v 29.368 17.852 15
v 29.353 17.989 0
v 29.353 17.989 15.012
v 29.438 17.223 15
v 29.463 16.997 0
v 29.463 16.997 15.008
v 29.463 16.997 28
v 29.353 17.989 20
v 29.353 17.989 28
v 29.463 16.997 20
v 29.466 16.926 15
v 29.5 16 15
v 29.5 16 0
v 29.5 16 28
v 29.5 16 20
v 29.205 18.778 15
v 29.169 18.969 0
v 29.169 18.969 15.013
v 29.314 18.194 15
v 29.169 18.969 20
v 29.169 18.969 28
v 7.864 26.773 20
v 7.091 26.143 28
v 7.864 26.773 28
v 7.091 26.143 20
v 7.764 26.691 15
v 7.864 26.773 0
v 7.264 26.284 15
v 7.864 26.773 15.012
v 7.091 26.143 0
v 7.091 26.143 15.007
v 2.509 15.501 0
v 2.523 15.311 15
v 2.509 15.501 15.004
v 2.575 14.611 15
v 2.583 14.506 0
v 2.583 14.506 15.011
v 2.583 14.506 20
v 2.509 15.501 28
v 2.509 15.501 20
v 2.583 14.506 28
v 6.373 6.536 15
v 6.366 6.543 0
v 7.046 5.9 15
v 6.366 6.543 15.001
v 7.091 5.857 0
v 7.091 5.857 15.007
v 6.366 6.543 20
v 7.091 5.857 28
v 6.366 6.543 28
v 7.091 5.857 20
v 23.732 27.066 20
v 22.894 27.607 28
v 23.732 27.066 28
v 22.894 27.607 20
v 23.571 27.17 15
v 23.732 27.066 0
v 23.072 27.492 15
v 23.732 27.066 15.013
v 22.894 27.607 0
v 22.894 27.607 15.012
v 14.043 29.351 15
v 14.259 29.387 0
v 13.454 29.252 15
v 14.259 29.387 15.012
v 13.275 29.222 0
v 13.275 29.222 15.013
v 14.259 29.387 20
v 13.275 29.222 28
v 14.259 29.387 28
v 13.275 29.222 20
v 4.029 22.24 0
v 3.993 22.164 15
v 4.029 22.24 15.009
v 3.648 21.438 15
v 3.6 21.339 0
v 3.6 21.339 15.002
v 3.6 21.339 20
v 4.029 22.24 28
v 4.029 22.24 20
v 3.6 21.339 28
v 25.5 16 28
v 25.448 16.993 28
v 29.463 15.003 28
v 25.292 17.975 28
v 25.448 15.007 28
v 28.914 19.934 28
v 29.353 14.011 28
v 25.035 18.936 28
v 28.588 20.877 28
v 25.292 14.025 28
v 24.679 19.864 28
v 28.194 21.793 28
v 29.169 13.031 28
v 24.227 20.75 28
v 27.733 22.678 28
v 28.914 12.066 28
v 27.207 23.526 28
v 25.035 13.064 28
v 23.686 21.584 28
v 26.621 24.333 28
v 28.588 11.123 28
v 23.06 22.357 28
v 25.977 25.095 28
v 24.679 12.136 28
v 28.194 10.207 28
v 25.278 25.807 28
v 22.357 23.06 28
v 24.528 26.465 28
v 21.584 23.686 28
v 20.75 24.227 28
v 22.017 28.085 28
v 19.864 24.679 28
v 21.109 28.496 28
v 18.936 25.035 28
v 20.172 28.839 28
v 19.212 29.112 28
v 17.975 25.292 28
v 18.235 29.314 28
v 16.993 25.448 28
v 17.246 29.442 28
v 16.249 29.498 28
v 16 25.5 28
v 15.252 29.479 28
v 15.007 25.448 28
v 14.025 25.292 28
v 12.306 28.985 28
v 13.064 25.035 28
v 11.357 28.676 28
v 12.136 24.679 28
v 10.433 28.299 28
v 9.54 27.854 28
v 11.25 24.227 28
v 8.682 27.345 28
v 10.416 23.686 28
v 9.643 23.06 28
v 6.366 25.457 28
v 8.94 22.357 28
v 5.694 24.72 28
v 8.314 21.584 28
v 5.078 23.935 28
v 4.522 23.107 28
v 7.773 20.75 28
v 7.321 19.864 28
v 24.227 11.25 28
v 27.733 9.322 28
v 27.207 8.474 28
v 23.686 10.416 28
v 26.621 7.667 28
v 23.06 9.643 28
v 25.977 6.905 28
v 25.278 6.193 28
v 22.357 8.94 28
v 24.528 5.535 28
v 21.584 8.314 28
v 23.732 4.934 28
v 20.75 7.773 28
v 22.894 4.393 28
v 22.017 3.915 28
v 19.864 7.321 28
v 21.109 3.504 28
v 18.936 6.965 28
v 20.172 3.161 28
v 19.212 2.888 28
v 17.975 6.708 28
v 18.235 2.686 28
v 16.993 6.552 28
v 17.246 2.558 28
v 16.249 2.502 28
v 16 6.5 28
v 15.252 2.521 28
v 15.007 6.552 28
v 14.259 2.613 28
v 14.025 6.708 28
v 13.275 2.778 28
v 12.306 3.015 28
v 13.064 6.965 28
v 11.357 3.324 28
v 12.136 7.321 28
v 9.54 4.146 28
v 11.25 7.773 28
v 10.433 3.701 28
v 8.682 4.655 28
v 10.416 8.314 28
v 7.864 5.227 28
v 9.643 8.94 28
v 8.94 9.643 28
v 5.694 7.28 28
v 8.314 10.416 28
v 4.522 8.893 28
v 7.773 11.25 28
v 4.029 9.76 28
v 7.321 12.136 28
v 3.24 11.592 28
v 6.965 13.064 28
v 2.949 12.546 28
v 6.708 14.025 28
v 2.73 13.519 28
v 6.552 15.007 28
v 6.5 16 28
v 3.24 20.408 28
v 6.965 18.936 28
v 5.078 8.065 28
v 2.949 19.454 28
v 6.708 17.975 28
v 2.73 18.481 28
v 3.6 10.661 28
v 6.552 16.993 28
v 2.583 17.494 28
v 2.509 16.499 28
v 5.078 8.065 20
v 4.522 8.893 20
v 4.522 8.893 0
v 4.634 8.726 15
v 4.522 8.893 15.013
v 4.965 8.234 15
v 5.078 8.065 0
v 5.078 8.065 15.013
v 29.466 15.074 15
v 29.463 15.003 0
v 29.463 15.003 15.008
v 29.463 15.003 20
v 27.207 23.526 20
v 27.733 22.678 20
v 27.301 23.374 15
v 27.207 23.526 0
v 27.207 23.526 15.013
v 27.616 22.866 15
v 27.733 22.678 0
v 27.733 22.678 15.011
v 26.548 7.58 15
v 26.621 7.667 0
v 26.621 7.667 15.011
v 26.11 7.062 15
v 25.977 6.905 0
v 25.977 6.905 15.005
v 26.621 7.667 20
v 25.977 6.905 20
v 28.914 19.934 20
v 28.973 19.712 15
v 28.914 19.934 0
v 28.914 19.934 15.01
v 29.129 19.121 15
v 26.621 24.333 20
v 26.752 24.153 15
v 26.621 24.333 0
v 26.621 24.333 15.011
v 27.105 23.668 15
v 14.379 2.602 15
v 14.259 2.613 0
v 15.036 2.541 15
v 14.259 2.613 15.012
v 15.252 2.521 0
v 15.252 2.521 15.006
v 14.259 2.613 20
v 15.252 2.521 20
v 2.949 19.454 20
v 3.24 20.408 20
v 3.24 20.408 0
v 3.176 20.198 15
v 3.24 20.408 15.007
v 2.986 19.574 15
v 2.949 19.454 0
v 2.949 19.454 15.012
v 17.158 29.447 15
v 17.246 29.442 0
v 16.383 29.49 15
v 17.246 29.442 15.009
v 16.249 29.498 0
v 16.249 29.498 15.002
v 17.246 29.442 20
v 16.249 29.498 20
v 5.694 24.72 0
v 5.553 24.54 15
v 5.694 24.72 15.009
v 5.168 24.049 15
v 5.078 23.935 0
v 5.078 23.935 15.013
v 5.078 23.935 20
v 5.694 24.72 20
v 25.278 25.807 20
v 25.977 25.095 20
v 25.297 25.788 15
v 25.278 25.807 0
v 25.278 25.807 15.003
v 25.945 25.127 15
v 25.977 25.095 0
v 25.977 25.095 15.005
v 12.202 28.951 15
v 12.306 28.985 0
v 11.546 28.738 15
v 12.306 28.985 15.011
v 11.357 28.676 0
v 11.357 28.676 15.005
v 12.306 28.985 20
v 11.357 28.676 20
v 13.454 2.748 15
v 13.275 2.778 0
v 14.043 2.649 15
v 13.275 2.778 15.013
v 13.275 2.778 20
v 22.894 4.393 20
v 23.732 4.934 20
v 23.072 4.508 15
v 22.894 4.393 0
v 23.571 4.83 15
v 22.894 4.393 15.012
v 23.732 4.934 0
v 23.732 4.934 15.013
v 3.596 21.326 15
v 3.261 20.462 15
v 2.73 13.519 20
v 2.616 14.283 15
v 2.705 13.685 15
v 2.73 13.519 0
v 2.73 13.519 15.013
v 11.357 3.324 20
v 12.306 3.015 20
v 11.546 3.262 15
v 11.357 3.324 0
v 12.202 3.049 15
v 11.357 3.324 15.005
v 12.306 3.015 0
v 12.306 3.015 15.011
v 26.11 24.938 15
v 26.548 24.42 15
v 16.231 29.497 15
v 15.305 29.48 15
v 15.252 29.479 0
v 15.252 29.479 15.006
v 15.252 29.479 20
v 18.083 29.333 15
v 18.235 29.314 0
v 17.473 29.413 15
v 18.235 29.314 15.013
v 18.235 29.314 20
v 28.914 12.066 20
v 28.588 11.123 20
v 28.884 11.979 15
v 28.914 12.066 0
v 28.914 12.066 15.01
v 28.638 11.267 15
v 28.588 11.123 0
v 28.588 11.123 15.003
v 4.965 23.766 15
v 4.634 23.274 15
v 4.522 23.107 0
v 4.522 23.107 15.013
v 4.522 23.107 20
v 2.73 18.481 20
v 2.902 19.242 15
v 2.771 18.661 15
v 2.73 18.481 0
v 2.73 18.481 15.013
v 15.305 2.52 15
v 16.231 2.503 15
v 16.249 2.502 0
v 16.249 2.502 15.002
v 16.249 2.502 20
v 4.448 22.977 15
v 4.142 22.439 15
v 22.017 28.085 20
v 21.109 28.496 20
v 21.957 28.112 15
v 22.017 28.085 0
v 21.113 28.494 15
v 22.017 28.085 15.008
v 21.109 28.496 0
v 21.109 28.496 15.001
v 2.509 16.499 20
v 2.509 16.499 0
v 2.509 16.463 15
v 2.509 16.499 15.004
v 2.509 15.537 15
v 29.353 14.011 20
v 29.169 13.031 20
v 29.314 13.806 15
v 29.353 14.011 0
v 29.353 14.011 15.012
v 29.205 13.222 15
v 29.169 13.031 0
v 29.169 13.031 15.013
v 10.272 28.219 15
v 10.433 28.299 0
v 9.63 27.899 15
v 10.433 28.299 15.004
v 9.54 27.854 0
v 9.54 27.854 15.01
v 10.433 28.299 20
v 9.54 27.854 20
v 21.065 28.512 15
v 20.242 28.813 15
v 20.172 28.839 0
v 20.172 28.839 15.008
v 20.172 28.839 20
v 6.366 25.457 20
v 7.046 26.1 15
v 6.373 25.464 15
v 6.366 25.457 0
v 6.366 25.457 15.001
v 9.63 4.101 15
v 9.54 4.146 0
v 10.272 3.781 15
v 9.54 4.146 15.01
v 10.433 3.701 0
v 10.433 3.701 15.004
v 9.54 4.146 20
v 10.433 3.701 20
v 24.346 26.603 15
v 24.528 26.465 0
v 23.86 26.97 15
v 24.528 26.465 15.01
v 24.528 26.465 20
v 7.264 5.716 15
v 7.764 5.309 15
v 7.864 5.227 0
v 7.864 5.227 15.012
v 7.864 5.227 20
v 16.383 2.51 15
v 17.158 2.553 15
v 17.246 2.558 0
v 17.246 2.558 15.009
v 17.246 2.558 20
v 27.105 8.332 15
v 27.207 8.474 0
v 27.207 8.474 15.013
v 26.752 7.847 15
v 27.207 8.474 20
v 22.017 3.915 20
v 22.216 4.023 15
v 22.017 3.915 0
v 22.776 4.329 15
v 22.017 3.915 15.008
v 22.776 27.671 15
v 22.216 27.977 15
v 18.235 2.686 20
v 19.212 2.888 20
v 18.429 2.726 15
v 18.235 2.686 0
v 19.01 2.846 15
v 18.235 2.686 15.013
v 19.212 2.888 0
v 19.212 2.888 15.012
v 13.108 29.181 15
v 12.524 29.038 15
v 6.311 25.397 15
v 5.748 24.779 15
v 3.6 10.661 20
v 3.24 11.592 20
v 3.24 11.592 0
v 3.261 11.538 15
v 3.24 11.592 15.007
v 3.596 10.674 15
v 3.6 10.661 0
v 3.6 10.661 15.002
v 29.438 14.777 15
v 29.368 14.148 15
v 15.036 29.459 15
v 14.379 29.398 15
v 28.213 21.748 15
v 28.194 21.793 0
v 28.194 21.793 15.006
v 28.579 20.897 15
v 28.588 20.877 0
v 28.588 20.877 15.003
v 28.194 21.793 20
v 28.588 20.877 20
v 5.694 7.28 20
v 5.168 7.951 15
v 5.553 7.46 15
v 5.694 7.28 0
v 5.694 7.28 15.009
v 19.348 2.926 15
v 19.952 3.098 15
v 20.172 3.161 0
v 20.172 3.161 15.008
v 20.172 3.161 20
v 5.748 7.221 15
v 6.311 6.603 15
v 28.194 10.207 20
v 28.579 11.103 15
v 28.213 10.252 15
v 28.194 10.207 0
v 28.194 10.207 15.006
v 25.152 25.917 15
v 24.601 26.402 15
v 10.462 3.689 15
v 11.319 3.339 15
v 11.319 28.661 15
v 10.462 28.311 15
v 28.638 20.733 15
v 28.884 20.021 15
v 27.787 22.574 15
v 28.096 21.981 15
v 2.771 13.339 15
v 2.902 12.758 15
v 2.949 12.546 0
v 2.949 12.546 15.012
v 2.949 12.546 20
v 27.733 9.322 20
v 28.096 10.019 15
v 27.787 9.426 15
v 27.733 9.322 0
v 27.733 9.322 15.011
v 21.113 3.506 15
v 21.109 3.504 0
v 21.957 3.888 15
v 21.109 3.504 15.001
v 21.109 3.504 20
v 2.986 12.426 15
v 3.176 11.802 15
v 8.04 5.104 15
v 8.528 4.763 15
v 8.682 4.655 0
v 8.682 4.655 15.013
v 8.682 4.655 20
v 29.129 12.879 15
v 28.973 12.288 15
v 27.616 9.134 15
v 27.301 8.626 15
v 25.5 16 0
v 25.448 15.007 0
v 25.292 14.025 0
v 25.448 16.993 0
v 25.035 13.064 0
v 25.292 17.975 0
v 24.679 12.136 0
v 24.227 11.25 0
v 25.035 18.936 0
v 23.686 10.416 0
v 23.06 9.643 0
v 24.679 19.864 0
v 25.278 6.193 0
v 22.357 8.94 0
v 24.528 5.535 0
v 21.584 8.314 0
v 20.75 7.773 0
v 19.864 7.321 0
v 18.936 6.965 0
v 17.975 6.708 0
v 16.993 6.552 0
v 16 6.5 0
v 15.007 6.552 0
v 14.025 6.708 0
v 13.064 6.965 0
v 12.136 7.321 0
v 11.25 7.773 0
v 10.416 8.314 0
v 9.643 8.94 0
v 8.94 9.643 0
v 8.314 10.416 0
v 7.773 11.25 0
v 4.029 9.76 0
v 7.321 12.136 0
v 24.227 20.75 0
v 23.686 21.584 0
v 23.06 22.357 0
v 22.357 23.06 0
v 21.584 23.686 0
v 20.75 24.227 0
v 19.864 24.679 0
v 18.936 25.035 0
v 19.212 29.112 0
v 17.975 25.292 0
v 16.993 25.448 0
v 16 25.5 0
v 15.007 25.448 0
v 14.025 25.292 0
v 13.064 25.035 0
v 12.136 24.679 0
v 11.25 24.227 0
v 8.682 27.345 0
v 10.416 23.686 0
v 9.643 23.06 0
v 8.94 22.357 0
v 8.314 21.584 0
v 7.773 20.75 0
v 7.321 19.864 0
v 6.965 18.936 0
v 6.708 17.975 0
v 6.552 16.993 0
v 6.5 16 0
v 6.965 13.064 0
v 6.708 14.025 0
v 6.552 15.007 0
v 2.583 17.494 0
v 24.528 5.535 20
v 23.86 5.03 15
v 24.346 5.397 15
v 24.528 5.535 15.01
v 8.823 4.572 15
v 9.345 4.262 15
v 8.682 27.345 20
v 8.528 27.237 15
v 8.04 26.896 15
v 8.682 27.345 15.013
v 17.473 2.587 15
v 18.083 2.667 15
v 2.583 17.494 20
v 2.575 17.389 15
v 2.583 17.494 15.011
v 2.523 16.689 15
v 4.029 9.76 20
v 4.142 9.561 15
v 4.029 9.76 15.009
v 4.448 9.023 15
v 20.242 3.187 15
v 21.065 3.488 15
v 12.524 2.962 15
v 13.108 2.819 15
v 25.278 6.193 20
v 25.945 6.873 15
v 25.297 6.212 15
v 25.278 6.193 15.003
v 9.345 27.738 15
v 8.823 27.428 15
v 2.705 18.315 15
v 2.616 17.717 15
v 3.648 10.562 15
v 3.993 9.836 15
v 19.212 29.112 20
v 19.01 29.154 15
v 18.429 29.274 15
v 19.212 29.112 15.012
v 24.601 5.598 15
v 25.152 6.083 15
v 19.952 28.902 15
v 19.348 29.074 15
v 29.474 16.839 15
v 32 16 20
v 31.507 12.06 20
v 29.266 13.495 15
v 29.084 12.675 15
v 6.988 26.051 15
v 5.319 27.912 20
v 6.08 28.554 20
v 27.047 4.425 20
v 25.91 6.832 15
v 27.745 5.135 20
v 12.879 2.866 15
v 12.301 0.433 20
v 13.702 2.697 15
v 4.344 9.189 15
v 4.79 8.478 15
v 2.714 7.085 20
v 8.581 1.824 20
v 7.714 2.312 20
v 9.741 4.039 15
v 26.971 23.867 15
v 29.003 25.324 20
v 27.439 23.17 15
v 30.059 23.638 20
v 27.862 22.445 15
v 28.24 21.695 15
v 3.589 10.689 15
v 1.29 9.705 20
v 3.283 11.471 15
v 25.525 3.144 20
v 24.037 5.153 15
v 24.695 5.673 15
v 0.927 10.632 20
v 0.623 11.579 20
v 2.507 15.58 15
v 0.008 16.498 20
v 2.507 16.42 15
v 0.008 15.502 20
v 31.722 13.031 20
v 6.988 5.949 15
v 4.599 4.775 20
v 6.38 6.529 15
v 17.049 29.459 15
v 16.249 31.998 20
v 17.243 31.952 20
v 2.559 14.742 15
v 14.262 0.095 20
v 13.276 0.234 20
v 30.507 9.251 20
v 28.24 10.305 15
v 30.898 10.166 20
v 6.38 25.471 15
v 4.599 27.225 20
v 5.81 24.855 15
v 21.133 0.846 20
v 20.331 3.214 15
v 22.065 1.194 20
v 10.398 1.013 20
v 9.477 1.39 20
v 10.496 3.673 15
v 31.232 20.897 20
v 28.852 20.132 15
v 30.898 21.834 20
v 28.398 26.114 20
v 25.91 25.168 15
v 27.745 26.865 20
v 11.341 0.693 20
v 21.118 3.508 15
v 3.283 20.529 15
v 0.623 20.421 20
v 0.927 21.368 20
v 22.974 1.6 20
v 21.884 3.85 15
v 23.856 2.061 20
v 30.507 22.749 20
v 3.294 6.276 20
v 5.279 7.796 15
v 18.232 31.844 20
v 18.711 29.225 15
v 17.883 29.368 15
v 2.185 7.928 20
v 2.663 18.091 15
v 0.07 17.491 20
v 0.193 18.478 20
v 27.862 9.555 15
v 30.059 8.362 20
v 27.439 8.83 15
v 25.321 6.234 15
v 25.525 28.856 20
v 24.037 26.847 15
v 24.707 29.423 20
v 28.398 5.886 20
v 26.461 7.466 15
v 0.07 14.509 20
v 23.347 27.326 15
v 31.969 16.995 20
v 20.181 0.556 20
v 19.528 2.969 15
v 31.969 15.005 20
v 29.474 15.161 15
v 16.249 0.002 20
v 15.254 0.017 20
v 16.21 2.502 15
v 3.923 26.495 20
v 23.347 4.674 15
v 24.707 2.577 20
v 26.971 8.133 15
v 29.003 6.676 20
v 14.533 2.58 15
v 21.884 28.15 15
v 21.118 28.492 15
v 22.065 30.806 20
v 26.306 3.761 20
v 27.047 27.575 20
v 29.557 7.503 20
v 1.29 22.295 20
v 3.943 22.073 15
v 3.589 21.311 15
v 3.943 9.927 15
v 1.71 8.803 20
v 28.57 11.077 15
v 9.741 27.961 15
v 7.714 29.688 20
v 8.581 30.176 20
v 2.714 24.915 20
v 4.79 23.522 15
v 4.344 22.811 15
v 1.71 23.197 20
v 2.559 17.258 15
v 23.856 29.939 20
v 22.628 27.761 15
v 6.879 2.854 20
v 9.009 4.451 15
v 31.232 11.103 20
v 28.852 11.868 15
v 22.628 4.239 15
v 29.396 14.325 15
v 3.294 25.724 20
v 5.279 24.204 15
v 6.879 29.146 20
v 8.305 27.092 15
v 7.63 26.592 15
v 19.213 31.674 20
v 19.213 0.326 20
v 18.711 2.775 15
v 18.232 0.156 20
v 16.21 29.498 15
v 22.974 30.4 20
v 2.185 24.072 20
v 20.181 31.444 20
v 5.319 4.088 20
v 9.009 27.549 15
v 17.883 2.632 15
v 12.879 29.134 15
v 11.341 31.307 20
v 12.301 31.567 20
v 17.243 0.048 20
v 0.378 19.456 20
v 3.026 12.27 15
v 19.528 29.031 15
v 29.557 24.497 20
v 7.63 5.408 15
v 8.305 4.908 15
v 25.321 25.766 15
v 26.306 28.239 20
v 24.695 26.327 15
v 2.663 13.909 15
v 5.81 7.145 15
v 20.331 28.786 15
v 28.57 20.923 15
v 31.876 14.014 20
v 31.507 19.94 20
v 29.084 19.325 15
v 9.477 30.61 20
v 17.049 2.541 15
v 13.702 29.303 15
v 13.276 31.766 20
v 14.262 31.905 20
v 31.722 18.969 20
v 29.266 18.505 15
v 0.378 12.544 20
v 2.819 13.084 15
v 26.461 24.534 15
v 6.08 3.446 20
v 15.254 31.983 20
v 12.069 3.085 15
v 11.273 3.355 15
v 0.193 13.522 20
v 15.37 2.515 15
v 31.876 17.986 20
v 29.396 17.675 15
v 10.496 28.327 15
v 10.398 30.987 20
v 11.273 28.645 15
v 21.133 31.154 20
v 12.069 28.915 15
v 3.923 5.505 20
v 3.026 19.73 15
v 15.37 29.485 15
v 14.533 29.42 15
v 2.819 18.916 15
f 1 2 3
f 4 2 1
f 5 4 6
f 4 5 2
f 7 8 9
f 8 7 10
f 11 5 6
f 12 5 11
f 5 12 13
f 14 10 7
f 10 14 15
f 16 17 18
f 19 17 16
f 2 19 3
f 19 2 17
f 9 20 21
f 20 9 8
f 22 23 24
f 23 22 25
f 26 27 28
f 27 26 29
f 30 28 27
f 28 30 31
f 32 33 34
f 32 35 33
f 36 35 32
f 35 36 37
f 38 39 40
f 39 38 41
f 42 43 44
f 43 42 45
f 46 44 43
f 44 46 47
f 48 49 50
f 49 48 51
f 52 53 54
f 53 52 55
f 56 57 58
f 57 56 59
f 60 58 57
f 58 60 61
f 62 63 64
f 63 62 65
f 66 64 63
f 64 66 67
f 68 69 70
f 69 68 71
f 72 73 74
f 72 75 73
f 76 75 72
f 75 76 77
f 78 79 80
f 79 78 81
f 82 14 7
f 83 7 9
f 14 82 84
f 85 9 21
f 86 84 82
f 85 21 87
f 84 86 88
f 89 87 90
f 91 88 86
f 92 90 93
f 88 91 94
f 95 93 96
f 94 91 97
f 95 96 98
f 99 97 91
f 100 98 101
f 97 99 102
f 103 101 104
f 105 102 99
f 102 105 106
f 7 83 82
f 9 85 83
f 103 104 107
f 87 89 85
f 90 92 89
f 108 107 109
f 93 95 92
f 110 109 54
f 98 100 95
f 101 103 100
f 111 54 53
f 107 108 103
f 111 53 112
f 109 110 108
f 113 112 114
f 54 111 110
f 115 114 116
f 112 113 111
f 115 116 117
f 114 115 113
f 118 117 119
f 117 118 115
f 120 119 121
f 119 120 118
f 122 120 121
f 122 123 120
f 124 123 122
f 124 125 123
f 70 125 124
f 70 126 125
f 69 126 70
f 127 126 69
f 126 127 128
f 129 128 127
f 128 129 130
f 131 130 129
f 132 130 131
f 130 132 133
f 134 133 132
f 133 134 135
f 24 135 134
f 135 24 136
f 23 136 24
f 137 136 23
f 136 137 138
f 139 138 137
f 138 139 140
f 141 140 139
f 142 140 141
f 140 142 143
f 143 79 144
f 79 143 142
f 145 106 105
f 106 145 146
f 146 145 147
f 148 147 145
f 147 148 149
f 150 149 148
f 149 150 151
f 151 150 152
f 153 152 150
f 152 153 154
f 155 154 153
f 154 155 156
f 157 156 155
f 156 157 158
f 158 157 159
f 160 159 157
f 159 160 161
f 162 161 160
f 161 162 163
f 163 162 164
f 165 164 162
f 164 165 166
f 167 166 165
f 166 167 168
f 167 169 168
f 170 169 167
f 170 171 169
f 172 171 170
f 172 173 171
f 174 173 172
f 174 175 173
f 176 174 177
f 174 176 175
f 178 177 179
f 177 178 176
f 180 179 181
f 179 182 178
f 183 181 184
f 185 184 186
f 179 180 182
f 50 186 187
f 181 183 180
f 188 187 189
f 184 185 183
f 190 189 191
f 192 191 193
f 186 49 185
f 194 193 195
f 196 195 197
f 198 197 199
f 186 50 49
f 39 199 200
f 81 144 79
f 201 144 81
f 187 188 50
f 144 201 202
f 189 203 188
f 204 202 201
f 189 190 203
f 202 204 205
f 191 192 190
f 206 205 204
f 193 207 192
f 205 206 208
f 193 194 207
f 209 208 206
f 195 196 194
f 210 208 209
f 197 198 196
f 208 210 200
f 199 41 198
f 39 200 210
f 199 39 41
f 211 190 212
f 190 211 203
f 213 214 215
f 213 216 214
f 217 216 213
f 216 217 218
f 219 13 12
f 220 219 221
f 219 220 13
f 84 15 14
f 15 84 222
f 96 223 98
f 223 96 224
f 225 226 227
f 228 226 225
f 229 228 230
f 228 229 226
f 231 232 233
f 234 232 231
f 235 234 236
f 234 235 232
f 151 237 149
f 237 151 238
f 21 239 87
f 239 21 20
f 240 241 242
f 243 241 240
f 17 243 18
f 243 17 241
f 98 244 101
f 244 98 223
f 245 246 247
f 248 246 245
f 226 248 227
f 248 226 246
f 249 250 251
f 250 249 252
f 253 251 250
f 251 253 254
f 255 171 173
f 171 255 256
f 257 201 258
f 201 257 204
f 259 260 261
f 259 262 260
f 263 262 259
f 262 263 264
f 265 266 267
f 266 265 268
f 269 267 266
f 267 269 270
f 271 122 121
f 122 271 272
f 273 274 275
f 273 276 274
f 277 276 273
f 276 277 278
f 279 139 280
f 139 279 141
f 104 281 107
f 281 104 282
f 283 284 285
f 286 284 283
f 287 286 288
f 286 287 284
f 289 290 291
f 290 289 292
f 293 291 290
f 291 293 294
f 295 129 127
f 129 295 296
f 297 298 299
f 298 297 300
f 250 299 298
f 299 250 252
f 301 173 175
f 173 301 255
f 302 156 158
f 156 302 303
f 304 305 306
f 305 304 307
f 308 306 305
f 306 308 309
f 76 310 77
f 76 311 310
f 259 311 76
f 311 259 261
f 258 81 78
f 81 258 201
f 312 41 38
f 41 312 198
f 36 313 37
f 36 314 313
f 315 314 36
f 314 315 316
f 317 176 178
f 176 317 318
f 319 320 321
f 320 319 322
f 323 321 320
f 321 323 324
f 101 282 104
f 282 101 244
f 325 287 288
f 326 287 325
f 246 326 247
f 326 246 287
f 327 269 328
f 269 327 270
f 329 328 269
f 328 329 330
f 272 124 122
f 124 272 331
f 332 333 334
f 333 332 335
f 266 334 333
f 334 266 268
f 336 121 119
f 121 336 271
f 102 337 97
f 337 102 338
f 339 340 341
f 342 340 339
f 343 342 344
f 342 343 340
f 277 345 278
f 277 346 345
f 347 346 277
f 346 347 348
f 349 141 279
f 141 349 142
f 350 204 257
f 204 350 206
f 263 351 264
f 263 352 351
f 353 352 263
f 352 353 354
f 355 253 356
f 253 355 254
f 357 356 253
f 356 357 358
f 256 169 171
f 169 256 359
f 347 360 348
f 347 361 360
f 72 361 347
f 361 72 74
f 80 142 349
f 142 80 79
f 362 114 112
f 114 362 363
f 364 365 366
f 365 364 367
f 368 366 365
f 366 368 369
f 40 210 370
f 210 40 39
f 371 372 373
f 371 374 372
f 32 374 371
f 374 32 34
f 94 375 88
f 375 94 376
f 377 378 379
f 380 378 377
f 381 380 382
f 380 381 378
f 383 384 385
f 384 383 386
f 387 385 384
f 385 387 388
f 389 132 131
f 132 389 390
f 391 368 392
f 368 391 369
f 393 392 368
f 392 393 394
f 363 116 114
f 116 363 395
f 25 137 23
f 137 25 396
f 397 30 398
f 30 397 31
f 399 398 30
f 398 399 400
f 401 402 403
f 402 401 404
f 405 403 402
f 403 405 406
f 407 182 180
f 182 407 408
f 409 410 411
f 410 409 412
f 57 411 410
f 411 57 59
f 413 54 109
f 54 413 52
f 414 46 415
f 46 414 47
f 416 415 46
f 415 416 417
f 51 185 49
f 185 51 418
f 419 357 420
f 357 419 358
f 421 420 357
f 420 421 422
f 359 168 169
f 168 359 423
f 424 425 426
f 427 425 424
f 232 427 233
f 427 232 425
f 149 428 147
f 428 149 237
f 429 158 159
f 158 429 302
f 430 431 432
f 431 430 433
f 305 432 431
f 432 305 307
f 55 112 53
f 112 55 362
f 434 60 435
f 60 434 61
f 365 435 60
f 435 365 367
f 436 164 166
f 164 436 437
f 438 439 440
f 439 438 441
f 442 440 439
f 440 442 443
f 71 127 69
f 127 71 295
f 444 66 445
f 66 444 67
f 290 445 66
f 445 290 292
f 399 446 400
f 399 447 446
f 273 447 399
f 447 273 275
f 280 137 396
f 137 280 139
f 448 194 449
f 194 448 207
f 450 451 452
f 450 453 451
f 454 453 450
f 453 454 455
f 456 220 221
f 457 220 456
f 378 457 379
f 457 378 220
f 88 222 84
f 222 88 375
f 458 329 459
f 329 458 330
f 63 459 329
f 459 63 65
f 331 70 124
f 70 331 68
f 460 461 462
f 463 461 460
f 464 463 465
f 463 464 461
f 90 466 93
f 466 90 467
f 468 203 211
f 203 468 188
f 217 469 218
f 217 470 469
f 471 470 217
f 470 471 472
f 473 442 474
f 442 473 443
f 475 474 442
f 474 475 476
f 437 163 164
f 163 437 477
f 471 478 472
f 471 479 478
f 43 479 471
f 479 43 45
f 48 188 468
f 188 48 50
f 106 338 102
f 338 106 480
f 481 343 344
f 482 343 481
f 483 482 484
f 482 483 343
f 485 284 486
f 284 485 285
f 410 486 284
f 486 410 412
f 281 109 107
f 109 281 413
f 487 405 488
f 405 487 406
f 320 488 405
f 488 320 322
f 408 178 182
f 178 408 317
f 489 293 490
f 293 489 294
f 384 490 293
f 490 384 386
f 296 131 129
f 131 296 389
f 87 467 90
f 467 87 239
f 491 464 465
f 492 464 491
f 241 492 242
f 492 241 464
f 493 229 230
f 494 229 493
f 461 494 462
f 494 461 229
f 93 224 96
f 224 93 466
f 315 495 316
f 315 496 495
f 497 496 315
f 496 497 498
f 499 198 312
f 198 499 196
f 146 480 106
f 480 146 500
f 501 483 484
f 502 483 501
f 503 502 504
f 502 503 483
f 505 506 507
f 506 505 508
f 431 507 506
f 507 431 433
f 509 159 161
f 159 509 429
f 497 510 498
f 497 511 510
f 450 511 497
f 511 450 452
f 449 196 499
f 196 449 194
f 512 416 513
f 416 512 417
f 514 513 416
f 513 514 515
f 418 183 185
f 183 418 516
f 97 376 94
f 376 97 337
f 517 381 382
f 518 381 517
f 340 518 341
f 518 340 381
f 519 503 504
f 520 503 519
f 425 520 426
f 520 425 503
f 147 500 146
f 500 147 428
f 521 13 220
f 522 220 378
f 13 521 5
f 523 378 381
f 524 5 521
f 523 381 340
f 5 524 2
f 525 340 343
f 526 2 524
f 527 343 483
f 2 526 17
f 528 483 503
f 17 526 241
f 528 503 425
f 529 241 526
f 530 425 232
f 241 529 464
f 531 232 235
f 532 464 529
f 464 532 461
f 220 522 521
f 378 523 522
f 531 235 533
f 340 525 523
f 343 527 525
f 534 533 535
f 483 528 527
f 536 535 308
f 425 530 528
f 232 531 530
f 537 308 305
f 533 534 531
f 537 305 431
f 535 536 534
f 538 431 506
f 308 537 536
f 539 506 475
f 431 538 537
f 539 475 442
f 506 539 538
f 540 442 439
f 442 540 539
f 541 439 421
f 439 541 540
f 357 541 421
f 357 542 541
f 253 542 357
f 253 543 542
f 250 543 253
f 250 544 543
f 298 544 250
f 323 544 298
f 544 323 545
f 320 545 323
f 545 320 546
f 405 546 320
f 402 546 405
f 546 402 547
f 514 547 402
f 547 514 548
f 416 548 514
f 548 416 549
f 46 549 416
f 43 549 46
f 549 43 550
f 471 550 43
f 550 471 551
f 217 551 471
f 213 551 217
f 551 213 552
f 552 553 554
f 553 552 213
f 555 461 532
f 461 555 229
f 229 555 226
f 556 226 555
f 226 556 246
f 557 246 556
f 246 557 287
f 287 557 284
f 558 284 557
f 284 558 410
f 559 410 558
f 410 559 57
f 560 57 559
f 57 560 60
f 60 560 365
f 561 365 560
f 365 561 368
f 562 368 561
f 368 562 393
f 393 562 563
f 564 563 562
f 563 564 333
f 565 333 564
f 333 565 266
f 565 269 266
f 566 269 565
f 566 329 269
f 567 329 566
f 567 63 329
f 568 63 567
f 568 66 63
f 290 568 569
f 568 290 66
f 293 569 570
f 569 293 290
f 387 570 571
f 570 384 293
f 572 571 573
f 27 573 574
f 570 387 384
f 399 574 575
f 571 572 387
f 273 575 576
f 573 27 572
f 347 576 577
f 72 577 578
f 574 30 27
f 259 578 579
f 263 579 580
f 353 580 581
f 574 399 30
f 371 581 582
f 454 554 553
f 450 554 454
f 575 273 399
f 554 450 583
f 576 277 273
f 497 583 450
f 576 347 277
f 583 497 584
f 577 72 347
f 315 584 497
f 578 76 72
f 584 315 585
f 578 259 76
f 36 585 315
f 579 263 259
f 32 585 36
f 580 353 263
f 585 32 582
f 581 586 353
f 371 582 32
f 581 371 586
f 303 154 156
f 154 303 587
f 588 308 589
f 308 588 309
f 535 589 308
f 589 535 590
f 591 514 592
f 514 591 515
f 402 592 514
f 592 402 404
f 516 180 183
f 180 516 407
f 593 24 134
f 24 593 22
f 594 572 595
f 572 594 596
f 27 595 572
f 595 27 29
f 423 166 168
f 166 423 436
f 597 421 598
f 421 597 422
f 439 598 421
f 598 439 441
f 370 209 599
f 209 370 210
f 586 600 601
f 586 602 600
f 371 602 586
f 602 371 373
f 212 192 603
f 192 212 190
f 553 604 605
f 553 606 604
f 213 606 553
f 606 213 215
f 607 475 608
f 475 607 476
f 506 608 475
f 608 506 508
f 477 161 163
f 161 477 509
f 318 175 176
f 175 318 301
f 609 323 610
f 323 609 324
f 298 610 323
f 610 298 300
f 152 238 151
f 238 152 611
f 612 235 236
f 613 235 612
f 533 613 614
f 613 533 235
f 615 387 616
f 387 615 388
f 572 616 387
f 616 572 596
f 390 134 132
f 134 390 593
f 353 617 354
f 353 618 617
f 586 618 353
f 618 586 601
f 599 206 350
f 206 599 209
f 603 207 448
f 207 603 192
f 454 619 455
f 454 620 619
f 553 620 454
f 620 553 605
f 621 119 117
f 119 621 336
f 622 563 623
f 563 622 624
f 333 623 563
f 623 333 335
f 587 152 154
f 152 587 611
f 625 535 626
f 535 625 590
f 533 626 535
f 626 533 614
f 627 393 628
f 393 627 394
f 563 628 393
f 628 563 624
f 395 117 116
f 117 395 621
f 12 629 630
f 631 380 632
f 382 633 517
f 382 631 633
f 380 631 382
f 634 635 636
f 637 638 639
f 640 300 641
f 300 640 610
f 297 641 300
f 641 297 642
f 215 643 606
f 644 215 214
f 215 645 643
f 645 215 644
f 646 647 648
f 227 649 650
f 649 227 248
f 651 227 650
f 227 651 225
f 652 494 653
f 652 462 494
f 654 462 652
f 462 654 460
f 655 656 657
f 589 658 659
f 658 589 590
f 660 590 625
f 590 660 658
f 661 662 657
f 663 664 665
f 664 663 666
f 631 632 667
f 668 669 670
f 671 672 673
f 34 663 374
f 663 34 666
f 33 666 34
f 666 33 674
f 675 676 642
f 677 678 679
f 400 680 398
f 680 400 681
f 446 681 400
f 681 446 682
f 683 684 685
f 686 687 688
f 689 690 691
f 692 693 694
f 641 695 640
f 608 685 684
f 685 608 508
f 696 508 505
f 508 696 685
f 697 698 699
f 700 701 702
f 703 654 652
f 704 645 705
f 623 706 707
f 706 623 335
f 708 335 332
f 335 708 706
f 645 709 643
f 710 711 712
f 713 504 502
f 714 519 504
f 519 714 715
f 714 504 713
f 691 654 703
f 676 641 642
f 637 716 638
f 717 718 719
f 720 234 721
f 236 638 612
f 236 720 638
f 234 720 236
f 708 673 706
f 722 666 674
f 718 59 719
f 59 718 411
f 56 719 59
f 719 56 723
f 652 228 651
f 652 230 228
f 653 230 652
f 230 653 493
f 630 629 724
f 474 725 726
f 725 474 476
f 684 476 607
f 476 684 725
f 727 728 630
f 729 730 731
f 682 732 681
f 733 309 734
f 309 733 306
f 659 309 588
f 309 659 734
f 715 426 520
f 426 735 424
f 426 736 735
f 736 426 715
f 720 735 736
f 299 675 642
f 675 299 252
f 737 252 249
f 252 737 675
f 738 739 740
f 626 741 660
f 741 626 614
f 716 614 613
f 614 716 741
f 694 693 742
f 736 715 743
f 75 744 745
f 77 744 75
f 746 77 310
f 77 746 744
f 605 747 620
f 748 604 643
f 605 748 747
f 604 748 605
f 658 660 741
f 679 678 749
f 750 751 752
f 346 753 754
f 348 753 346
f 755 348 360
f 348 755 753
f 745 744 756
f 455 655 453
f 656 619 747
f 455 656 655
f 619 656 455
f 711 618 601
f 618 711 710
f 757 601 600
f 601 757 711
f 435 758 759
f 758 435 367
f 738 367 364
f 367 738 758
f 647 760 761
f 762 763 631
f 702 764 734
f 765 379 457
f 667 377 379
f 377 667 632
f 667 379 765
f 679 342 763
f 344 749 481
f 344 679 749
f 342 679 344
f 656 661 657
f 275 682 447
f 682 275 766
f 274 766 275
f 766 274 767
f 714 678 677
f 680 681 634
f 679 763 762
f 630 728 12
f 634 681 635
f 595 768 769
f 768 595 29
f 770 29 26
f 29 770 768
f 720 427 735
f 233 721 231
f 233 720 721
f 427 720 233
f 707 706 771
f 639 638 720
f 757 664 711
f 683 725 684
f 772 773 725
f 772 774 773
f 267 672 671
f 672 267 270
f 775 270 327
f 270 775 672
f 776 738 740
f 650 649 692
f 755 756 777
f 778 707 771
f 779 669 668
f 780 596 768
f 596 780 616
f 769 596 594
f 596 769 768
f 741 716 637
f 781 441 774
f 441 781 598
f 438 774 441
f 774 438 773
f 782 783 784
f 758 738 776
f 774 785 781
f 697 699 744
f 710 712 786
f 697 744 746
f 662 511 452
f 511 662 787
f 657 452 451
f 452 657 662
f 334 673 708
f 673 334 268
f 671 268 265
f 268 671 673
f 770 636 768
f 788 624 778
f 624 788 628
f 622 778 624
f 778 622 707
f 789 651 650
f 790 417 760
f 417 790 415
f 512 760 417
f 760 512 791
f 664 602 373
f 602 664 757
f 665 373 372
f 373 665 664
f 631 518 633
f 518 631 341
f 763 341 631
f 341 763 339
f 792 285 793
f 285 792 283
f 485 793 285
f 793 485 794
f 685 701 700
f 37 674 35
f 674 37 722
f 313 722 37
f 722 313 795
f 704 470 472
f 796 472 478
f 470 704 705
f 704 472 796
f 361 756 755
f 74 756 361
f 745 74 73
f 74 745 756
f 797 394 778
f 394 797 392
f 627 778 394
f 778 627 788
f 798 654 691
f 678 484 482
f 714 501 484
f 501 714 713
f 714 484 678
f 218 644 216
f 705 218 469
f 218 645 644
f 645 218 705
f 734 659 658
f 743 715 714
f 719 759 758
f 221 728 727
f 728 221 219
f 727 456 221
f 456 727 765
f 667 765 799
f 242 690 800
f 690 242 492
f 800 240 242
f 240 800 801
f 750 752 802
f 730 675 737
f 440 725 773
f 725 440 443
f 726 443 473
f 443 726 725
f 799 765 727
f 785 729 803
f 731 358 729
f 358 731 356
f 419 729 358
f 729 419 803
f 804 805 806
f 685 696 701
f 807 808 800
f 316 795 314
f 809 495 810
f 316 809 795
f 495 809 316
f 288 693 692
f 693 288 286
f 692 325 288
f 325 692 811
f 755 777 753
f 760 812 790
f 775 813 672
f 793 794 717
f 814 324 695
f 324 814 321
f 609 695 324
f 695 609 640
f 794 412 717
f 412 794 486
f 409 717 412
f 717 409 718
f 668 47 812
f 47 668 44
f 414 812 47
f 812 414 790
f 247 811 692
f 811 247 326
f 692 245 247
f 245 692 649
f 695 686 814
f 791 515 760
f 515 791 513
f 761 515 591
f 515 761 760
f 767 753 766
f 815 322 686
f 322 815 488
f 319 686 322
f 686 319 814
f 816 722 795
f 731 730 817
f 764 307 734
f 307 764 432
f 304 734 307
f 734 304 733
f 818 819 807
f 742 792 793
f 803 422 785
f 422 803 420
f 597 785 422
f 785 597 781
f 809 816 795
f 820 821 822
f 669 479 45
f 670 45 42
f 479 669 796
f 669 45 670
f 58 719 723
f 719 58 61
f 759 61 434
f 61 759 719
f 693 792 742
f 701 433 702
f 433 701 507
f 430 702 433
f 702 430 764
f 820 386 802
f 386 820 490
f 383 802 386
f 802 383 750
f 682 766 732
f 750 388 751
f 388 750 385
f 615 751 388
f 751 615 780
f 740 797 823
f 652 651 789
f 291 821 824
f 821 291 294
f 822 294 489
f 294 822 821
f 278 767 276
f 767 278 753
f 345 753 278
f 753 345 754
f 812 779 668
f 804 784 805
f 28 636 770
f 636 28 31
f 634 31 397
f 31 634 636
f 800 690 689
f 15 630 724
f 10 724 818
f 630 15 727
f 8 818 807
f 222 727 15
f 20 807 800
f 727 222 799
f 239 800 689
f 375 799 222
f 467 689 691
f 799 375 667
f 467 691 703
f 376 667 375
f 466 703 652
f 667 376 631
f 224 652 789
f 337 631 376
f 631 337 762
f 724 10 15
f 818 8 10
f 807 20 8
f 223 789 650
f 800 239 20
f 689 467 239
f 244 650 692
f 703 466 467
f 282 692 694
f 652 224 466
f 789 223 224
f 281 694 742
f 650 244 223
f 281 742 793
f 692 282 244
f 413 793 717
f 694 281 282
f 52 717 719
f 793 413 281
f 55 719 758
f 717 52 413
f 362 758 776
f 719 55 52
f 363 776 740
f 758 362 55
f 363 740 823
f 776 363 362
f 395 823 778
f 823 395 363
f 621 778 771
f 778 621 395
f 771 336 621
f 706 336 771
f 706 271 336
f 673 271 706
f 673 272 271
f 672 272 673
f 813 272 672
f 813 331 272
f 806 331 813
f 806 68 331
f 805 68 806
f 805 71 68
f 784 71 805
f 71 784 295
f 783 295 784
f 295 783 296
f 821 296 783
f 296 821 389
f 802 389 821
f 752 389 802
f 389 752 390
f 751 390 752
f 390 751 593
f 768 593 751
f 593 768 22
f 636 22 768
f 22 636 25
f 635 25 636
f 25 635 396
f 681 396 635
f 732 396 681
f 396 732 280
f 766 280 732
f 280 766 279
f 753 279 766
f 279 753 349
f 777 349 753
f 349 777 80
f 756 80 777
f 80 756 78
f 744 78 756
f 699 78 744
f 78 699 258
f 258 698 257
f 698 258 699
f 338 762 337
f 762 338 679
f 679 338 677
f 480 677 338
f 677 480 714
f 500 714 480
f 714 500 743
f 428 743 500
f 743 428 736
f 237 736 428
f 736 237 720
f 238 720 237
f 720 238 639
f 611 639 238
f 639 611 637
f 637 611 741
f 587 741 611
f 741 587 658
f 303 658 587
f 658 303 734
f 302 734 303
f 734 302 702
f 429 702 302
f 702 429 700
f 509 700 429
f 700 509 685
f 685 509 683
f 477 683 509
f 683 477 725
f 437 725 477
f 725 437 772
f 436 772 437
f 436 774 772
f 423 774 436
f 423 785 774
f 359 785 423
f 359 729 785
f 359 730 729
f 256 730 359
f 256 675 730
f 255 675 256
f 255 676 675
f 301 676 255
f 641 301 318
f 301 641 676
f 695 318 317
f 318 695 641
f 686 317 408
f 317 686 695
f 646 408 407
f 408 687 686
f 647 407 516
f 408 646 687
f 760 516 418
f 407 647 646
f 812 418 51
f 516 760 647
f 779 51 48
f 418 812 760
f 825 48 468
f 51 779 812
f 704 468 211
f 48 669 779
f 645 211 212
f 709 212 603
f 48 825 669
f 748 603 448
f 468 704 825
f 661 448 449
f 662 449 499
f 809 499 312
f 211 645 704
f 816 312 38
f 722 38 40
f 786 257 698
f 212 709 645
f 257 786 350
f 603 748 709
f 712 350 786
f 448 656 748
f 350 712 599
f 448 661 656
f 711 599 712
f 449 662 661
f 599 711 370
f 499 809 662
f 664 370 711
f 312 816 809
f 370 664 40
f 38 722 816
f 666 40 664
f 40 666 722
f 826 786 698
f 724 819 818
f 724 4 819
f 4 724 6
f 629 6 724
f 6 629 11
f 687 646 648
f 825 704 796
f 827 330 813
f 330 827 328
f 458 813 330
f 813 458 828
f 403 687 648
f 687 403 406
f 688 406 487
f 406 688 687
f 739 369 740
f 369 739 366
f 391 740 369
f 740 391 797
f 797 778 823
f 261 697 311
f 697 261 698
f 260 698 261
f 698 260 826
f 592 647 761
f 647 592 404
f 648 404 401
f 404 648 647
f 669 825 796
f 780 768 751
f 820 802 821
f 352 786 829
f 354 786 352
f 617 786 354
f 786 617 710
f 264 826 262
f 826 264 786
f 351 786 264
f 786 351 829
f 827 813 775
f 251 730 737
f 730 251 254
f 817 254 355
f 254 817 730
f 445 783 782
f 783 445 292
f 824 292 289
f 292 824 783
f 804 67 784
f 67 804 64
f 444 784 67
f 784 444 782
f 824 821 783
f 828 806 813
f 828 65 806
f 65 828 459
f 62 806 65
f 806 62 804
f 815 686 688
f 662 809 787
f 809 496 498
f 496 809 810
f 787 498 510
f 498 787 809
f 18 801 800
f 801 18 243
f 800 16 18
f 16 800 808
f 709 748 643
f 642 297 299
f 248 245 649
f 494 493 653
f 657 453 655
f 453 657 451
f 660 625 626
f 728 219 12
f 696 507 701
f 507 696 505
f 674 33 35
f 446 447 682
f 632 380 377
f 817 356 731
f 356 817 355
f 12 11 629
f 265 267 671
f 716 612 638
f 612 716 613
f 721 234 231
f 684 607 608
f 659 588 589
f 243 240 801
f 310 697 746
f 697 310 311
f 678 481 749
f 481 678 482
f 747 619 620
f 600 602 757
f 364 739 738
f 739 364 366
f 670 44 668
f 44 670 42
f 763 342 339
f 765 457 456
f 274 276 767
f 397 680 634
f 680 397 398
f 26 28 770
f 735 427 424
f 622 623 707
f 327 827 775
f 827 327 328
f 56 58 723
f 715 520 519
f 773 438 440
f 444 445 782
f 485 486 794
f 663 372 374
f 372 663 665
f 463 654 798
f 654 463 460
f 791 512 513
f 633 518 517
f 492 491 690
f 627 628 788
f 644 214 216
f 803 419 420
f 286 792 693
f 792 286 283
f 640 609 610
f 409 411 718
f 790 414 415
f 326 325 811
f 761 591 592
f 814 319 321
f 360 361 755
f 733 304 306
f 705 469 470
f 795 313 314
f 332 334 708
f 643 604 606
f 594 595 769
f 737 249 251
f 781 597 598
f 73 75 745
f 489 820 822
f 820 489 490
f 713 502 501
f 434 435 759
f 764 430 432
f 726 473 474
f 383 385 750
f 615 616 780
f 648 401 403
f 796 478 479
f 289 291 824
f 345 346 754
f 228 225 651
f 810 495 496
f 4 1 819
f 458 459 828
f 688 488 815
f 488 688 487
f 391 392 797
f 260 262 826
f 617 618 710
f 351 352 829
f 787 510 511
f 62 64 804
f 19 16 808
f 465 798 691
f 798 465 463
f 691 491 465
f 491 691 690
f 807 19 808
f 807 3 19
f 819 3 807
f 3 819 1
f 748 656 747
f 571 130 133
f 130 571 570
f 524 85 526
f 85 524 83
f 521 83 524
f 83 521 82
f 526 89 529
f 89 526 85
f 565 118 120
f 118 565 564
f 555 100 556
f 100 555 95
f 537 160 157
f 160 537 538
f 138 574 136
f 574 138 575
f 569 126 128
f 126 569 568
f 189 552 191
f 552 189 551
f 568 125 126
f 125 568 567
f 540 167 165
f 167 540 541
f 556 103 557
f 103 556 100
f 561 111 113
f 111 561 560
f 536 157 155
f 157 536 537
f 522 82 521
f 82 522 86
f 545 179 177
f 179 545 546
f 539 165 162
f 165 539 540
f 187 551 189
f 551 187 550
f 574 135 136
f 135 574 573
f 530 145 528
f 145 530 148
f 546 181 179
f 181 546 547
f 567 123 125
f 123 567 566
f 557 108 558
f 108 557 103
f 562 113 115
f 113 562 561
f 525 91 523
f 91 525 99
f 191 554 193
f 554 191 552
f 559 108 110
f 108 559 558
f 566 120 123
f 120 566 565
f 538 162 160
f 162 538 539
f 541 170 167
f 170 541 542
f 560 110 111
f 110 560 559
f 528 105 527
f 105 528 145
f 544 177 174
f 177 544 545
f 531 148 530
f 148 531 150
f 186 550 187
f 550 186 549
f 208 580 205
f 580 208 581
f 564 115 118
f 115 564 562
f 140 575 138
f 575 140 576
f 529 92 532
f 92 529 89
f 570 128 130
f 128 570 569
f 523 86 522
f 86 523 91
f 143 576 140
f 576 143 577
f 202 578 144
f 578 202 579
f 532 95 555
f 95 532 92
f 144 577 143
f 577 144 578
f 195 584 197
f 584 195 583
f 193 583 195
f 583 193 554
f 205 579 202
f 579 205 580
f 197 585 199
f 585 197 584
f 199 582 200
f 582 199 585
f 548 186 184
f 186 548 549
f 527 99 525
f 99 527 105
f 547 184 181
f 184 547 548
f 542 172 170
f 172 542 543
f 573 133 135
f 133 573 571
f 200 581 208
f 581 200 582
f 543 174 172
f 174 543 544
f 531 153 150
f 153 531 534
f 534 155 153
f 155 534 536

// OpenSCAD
//
// Customizable Spool Axle Adapter (by Robert Halter)
// Licensed: Creative Commons - Attribution - Non-Commercial - Share Alike (by-nc-sa)
// see: http://en.wikipedia.org/wiki/Creative_Commons
//
// Generates one adapter - print two of it to be symmetric
// I optimzed/reduced the used Material on the bigger diameter.
//
// Thanks to Emanresu.
// Original design and code by emanresu (http://www.thingiverse.com/Emanresu)
// Customizable Spool Adapter http://www.thingiverse.com/thing:82800
// Origianl Text from him: 
// Generates two symmetric spool bearings/axle adapters/what have you
// spacer can be used to center the spool on a specific axle,
// or to simply keep the bearing/axle adapter from sliding into the spool


// parametrizable user values - change if you want

/* [Diameter] */

// diameter of the axle hole [mm]
axle_hole_diameter = 19;

// diameter of spool hole [mm]
spool_hole_diameter = 27;

// diameter of spool hole [mm]
adapter_diameter = spool_hole_diameter + 5;

/* [Lengts] */

// length of spacer [mm] (useful for centering a spool) 
spacer_length = 20;

// distance bearing sticks into spool hole [mm]
spool_hole_depth = 8;



/* [Hidden] */

// set openSCAD resolution
$fa = 1;
$fs = 1;

// begin of form

// translate to x, y, z = 0
translate([adapter_diameter/2, adapter_diameter/2, 0]) {
	difference() {
		union() {
			// inner adapter
			cylinder(r = spool_hole_diameter/2, h = spacer_length + spool_hole_depth);
			// outer adapter cylinder
			translate([0, 0, spacer_length - (adapter_diameter - spool_hole_diameter)]) {
				cylinder(r2 = adapter_diameter/2, r1 = spool_hole_diameter/2, h = adapter_diameter - spool_hole_diameter);
			}
		}
		// axle hole
      // to be sure make the hole on each end 1 mm longer
		translate([0, 0, -1]) {
      	cylinder(r = axle_hole_diameter/2, h = spacer_length + spool_hole_depth + 2);
		} // translate
	} // difference
} // translate

// end of form
